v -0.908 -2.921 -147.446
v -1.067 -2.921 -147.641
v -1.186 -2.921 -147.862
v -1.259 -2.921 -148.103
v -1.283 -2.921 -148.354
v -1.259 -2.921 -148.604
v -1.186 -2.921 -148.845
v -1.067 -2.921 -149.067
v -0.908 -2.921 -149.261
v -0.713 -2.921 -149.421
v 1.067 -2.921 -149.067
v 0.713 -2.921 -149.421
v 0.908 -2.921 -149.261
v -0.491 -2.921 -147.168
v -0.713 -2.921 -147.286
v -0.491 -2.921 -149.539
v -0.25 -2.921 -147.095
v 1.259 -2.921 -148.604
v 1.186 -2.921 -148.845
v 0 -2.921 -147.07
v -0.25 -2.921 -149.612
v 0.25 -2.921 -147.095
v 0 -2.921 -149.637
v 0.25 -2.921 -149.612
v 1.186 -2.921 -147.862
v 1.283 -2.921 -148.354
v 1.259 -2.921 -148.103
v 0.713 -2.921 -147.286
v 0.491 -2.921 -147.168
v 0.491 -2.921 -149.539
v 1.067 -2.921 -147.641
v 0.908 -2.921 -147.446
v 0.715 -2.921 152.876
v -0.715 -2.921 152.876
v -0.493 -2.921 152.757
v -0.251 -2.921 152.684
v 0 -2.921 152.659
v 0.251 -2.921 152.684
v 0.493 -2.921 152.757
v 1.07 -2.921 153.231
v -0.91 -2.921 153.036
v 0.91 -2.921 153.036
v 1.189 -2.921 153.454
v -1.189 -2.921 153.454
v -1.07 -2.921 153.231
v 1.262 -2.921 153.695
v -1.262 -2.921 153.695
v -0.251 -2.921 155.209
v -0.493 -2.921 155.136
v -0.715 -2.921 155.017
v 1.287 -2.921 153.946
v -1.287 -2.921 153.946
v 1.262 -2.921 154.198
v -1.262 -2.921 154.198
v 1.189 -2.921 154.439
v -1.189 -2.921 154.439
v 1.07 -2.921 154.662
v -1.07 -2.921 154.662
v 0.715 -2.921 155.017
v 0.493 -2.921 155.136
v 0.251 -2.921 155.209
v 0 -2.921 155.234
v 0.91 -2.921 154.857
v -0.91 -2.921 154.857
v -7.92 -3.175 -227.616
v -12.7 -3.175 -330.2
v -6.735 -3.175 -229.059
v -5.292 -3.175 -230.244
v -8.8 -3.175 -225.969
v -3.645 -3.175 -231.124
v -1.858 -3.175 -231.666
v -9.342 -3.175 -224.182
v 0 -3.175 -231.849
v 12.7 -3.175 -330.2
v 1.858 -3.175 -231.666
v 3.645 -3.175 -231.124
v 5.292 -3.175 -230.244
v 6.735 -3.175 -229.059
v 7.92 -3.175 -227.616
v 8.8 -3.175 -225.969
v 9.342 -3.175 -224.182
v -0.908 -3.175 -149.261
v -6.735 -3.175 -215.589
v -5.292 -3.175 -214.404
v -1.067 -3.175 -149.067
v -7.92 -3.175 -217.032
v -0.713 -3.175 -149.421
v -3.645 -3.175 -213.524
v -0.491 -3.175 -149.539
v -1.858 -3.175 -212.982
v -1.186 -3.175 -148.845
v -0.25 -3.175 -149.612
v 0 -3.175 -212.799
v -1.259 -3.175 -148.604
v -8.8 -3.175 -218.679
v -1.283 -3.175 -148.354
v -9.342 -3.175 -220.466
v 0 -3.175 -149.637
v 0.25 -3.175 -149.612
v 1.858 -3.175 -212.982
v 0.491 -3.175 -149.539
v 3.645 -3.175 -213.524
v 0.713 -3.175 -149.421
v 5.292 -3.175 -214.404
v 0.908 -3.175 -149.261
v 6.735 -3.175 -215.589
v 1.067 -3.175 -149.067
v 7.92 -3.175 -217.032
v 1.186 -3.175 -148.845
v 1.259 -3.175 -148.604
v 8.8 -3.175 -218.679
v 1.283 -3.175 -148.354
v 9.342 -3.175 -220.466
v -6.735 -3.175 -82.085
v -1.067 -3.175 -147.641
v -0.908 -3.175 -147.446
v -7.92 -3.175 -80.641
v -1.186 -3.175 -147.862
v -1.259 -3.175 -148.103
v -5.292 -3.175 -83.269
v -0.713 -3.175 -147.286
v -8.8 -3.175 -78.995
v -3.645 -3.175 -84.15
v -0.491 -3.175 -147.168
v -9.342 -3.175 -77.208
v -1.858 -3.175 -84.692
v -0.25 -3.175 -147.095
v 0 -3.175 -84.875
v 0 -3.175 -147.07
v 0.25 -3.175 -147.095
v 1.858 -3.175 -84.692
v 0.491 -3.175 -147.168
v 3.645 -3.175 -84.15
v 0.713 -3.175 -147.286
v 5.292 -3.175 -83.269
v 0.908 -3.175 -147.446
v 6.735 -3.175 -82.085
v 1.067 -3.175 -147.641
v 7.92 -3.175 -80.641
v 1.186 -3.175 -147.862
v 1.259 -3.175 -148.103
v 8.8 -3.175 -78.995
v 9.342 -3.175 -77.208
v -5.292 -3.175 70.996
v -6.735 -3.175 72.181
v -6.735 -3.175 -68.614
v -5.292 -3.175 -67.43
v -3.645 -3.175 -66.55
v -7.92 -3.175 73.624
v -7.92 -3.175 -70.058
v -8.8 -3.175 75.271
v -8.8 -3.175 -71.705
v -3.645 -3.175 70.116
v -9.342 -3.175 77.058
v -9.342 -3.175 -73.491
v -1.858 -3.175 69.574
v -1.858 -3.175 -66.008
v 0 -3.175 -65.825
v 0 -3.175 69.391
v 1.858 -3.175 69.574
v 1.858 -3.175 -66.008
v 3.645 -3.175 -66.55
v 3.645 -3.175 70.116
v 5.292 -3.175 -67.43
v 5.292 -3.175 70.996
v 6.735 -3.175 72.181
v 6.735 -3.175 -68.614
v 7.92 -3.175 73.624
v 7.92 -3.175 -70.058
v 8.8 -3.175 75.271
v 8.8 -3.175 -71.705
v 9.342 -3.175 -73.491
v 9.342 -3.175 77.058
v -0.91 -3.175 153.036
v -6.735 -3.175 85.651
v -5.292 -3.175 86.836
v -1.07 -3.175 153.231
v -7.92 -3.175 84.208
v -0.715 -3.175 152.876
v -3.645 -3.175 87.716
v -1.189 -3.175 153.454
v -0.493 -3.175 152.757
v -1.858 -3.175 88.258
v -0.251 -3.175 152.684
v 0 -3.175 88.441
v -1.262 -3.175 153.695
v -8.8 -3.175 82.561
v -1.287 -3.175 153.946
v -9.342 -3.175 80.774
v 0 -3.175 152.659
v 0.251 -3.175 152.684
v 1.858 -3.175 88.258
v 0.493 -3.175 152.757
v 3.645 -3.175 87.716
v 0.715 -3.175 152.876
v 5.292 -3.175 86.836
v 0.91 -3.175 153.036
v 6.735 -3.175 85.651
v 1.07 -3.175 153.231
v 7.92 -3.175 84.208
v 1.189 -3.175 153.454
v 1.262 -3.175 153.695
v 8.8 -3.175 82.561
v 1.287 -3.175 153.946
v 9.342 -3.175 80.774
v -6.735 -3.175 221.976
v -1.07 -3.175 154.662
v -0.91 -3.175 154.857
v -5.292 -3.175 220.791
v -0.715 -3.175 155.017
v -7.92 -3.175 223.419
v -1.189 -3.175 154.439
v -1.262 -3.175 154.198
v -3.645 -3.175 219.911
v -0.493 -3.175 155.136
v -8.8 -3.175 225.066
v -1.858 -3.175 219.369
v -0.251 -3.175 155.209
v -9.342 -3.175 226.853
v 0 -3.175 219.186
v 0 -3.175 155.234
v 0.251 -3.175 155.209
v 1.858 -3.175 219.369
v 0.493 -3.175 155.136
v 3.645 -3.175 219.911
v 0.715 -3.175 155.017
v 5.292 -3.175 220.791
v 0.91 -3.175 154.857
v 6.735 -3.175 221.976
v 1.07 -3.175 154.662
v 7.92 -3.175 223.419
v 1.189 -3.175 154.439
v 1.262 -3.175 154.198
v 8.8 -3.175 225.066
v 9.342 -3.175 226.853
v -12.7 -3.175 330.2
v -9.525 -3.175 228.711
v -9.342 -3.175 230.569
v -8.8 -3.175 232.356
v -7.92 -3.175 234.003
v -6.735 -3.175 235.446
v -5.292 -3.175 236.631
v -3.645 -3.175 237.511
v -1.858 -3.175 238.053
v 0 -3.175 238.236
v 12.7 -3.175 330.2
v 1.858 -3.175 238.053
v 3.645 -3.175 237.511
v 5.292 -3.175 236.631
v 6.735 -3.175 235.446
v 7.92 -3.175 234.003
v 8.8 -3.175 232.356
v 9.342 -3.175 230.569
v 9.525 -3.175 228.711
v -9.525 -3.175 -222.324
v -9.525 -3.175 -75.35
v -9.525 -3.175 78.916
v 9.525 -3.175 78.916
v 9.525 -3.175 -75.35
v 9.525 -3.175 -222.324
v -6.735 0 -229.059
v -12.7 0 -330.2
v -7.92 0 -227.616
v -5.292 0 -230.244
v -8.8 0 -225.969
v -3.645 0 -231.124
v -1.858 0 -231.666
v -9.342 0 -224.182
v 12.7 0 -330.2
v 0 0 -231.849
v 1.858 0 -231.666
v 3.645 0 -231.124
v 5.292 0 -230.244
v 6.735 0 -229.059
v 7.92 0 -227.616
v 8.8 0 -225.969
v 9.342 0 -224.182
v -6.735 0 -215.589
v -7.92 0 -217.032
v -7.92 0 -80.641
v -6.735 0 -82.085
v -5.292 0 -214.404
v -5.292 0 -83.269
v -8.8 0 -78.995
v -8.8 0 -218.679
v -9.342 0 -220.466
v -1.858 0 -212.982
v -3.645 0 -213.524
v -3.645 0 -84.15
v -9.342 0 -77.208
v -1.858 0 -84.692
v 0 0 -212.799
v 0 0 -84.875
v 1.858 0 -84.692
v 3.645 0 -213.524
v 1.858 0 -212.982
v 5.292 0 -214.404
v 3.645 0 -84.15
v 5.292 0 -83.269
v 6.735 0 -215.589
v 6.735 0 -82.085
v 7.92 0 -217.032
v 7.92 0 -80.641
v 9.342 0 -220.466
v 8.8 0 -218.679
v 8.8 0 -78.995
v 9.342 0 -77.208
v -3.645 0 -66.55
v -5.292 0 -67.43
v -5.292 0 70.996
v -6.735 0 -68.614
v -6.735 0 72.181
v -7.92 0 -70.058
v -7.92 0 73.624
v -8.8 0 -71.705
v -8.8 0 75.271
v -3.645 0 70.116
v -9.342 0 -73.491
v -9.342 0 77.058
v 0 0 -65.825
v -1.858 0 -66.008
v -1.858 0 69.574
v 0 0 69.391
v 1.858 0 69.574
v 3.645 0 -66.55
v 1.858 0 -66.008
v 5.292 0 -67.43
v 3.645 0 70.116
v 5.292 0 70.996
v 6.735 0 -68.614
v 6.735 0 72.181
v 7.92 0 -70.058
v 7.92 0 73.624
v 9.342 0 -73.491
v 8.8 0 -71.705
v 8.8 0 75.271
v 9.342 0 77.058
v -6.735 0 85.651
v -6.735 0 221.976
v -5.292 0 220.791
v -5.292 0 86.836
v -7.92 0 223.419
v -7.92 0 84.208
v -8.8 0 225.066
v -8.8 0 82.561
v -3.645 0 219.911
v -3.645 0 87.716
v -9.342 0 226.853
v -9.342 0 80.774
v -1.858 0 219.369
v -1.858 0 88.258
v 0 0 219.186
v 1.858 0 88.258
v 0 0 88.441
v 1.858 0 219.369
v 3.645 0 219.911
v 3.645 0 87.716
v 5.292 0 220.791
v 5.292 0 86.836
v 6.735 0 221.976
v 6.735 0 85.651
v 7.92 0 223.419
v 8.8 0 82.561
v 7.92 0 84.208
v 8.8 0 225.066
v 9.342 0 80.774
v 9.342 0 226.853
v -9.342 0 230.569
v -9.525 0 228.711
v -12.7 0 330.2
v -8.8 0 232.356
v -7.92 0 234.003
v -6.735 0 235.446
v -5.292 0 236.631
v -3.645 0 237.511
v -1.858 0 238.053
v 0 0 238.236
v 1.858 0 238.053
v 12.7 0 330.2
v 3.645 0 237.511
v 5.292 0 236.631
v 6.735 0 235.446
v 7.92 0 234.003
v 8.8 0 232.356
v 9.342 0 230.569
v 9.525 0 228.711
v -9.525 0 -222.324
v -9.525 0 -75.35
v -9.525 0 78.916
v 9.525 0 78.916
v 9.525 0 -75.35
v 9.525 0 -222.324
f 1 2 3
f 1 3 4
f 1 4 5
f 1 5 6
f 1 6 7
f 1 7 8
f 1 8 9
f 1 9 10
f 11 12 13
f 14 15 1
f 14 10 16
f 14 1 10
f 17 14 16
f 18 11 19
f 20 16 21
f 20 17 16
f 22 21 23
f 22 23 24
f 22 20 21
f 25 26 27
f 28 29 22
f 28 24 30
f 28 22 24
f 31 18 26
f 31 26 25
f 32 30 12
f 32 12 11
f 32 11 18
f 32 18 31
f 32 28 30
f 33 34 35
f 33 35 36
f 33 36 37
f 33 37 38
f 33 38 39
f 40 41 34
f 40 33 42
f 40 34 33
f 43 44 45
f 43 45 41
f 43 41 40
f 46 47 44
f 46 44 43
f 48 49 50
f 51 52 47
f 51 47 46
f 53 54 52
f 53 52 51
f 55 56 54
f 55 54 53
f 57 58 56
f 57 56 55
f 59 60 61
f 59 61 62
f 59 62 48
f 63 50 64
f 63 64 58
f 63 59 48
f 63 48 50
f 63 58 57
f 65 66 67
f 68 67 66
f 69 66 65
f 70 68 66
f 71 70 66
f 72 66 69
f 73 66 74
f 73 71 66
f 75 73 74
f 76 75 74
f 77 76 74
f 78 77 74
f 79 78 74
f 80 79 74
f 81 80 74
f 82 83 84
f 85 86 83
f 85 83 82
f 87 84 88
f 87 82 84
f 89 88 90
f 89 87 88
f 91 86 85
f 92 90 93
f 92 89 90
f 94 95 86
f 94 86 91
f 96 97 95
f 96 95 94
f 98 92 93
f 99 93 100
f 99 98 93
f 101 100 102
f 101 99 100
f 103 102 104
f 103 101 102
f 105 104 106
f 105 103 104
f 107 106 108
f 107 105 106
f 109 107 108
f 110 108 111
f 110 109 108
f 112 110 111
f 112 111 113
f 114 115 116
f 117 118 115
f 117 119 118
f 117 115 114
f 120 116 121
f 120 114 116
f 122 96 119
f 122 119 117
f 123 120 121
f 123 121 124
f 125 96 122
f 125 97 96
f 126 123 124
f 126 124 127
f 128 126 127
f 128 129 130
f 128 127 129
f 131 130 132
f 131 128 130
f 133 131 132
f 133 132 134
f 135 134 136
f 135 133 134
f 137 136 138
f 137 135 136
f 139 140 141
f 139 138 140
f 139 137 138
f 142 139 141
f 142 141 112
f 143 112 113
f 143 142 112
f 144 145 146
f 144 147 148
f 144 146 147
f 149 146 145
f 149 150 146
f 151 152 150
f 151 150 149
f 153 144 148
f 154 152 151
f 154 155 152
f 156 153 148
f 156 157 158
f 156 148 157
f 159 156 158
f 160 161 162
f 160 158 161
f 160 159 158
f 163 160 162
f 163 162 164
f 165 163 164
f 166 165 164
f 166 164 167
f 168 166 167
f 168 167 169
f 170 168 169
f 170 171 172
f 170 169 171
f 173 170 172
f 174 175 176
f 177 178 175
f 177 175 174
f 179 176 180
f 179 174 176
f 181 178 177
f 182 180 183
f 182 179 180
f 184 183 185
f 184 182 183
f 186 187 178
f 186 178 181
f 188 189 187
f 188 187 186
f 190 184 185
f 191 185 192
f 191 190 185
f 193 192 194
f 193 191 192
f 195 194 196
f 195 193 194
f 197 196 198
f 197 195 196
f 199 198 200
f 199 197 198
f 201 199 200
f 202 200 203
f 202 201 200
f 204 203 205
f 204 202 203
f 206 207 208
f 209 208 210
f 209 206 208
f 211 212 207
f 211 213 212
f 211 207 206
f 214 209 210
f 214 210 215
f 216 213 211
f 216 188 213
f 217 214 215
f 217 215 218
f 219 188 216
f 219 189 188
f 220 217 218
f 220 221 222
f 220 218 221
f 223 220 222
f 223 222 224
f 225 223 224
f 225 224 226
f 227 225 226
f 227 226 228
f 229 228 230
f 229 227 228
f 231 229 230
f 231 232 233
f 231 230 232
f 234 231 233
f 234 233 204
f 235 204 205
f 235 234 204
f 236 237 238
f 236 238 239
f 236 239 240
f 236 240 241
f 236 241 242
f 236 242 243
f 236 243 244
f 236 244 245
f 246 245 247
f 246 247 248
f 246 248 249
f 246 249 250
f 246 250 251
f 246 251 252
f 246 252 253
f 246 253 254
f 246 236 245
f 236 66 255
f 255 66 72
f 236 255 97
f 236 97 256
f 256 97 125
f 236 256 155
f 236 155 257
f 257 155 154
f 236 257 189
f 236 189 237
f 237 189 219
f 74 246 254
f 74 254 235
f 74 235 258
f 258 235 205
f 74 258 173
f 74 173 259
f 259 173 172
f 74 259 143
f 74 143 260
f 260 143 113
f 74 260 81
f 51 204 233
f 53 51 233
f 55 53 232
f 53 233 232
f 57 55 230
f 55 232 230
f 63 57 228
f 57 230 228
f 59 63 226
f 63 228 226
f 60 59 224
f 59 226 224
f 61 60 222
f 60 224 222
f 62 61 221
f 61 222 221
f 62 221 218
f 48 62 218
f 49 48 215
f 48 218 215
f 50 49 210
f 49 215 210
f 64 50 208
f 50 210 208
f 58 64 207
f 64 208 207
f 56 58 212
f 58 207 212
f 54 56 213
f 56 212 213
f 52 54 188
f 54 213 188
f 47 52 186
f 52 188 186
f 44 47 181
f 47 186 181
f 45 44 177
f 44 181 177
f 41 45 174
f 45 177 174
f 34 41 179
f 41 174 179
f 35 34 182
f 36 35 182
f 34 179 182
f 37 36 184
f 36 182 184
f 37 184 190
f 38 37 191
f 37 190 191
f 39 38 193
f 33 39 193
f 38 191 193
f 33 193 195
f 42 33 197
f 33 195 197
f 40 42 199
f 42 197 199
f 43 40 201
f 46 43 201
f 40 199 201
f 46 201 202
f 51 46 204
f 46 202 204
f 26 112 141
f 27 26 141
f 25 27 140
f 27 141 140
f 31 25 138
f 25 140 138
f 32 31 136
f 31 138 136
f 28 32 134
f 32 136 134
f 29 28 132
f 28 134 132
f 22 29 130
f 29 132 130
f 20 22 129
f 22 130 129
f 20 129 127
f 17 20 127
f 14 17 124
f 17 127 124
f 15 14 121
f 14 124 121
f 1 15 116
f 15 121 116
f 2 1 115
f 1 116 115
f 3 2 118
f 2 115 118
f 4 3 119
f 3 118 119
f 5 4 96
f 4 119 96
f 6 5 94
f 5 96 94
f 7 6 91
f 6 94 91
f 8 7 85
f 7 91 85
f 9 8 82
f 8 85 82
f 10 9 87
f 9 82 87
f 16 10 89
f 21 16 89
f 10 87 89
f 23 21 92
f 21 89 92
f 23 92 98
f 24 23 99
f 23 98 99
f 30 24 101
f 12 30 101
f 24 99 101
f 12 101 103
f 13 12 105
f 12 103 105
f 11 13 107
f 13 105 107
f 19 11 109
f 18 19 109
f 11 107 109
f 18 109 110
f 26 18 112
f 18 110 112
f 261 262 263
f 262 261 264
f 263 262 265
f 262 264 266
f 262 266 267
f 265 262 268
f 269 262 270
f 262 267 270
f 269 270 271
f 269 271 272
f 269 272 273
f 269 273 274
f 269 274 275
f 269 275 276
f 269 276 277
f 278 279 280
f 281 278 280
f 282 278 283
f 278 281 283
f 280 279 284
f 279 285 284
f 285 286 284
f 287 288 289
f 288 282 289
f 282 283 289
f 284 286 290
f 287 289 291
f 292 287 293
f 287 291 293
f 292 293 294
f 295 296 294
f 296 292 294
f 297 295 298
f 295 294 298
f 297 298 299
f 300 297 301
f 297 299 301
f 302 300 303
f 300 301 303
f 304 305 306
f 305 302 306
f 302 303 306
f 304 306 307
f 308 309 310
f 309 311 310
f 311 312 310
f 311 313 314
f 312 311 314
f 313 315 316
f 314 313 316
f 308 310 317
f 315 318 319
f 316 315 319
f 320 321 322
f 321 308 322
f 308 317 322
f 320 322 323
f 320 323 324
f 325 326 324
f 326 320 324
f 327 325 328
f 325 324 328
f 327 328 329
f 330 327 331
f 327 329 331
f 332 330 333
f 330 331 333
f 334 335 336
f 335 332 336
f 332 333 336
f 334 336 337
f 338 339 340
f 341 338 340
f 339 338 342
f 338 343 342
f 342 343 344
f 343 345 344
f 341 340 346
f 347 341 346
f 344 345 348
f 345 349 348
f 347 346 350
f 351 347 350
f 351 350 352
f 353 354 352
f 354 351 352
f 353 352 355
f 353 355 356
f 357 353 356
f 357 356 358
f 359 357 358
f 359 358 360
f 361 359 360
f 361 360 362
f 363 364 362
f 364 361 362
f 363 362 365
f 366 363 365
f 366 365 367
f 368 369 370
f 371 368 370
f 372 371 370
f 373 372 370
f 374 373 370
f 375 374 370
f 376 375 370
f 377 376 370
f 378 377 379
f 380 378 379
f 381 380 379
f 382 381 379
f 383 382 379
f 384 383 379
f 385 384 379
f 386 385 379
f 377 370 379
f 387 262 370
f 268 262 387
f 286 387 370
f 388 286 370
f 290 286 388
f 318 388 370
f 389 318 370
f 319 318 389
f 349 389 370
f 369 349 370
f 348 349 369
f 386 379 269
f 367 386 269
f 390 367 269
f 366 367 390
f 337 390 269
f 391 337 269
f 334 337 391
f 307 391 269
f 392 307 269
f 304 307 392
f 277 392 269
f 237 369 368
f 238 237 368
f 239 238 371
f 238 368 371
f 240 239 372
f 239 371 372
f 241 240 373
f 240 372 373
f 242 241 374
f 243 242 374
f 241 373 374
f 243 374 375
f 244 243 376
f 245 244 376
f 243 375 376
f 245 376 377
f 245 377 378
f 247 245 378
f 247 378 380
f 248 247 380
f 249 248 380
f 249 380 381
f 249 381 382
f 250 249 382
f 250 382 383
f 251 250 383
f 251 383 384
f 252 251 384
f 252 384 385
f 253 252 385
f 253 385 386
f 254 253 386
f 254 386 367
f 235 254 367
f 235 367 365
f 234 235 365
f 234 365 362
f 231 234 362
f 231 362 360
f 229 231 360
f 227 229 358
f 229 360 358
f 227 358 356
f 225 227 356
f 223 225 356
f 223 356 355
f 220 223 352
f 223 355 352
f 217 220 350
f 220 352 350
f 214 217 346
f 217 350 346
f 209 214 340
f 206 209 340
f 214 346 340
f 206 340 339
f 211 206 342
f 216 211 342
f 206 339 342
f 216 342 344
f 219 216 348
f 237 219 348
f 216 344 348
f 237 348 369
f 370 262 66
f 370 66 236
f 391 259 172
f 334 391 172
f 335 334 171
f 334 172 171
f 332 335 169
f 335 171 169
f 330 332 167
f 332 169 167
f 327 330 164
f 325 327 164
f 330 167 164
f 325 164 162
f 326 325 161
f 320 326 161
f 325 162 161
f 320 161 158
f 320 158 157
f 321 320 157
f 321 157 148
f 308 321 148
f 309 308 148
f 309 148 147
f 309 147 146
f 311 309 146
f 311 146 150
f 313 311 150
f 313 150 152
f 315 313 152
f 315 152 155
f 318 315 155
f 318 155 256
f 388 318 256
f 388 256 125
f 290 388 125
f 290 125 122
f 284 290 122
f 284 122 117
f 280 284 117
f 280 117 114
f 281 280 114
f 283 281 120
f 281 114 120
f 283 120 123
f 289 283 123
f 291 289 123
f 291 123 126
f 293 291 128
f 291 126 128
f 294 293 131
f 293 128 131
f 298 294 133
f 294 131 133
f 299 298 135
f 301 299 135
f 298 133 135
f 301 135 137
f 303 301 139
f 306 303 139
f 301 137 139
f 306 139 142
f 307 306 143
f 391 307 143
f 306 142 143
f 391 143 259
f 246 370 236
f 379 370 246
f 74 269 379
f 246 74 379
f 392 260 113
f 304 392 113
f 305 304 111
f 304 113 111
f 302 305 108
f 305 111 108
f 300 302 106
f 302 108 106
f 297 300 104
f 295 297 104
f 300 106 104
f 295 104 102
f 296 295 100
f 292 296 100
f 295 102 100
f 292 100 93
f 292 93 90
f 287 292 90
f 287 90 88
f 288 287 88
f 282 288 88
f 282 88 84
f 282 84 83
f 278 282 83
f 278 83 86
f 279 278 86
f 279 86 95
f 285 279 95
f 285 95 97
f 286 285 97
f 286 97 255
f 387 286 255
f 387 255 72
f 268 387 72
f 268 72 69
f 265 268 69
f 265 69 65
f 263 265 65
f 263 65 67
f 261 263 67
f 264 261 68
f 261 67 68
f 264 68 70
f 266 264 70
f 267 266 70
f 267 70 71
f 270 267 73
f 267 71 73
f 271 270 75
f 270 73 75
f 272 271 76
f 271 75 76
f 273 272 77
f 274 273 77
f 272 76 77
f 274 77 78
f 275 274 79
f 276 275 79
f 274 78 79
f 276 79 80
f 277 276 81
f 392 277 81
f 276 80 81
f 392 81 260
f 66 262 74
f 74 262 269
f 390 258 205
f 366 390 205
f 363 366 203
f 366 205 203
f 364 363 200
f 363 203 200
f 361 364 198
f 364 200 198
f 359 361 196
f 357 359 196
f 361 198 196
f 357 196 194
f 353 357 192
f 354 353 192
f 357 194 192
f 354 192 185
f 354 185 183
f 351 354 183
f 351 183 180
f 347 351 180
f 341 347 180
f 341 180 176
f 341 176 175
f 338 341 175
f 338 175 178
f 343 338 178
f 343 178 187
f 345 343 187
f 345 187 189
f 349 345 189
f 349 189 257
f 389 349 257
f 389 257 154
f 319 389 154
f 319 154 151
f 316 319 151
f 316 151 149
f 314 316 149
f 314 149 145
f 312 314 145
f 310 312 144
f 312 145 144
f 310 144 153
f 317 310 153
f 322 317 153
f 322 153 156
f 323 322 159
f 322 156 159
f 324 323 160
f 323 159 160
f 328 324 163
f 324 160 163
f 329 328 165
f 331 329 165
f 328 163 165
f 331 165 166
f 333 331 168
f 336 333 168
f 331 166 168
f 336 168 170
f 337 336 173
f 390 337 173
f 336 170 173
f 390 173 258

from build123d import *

# Parameters (mm, degrees)
F0_W      = 25.4
F0_H      = 660.4
F1_DEPTH  = 3.175
F2_R      = 9.525
F3_DEPTH  = 25.4
F4_R      = 9.525
F5_DEPTH  = 25.4
F6_R      = 9.525
F7_DEPTH  = 25.4
F8_R      = 9.525
F9_DEPTH  = 25.4
F11_R     = 1.287189
F12_DEPTH = 0.254
F13_R     = 1.283426
F14_DEPTH = 0.254


with BuildPart() as f1:
    # F0 (on Front) → F1 (new body)
    with BuildSketch(Plane.XZ):
        Rectangle(F0_W, F0_H)
    extrude(amount=F1_DEPTH)

    # F2 (on face) → F3 (cut)
    with BuildSketch(Plane.XZ.offset(3.175)):
        with Locations((0, 78.915866)):
            Circle(F2_R)
    extrude(amount=-F3_DEPTH, mode=Mode.SUBTRACT)

    # F4 (on face) → F5 (cut)
    with BuildSketch(Plane.XZ.offset(3.175)):
        with Locations((0, -75.349567)):
            Circle(F4_R)
    extrude(amount=-F5_DEPTH, mode=Mode.SUBTRACT)

    # F6 (on face) → F7 (cut)
    with BuildSketch(Plane.XZ.offset(3.175)):
        with Locations((0, -222.324208)):
            Circle(F6_R)
    extrude(amount=-F7_DEPTH, mode=Mode.SUBTRACT)

    # F8 (on face) → F9 (cut)
    with BuildSketch(Plane(origin=(0, 0, 0), x_dir=(-1, 0, 0), z_dir=(0, 1, 0))):
        with Locations((0, 228.710903)):
            Circle(F8_R)
    extrude(amount=-F9_DEPTH, mode=Mode.SUBTRACT)

    # F11 (on face) → F12 (cut)
    with BuildSketch(Plane.XZ.offset(3.175)):
        with Locations((0, 153.946459)):
            Circle(F11_R)
    extrude(amount=-F12_DEPTH, mode=Mode.SUBTRACT)

    # F13 (on face) → F14 (cut)
    with BuildSketch(Plane.XZ.offset(3.175)):
        with Locations((0, -148.353621)):
            Circle(F13_R)
    extrude(amount=-F14_DEPTH, mode=Mode.SUBTRACT)


solid = f1.part
